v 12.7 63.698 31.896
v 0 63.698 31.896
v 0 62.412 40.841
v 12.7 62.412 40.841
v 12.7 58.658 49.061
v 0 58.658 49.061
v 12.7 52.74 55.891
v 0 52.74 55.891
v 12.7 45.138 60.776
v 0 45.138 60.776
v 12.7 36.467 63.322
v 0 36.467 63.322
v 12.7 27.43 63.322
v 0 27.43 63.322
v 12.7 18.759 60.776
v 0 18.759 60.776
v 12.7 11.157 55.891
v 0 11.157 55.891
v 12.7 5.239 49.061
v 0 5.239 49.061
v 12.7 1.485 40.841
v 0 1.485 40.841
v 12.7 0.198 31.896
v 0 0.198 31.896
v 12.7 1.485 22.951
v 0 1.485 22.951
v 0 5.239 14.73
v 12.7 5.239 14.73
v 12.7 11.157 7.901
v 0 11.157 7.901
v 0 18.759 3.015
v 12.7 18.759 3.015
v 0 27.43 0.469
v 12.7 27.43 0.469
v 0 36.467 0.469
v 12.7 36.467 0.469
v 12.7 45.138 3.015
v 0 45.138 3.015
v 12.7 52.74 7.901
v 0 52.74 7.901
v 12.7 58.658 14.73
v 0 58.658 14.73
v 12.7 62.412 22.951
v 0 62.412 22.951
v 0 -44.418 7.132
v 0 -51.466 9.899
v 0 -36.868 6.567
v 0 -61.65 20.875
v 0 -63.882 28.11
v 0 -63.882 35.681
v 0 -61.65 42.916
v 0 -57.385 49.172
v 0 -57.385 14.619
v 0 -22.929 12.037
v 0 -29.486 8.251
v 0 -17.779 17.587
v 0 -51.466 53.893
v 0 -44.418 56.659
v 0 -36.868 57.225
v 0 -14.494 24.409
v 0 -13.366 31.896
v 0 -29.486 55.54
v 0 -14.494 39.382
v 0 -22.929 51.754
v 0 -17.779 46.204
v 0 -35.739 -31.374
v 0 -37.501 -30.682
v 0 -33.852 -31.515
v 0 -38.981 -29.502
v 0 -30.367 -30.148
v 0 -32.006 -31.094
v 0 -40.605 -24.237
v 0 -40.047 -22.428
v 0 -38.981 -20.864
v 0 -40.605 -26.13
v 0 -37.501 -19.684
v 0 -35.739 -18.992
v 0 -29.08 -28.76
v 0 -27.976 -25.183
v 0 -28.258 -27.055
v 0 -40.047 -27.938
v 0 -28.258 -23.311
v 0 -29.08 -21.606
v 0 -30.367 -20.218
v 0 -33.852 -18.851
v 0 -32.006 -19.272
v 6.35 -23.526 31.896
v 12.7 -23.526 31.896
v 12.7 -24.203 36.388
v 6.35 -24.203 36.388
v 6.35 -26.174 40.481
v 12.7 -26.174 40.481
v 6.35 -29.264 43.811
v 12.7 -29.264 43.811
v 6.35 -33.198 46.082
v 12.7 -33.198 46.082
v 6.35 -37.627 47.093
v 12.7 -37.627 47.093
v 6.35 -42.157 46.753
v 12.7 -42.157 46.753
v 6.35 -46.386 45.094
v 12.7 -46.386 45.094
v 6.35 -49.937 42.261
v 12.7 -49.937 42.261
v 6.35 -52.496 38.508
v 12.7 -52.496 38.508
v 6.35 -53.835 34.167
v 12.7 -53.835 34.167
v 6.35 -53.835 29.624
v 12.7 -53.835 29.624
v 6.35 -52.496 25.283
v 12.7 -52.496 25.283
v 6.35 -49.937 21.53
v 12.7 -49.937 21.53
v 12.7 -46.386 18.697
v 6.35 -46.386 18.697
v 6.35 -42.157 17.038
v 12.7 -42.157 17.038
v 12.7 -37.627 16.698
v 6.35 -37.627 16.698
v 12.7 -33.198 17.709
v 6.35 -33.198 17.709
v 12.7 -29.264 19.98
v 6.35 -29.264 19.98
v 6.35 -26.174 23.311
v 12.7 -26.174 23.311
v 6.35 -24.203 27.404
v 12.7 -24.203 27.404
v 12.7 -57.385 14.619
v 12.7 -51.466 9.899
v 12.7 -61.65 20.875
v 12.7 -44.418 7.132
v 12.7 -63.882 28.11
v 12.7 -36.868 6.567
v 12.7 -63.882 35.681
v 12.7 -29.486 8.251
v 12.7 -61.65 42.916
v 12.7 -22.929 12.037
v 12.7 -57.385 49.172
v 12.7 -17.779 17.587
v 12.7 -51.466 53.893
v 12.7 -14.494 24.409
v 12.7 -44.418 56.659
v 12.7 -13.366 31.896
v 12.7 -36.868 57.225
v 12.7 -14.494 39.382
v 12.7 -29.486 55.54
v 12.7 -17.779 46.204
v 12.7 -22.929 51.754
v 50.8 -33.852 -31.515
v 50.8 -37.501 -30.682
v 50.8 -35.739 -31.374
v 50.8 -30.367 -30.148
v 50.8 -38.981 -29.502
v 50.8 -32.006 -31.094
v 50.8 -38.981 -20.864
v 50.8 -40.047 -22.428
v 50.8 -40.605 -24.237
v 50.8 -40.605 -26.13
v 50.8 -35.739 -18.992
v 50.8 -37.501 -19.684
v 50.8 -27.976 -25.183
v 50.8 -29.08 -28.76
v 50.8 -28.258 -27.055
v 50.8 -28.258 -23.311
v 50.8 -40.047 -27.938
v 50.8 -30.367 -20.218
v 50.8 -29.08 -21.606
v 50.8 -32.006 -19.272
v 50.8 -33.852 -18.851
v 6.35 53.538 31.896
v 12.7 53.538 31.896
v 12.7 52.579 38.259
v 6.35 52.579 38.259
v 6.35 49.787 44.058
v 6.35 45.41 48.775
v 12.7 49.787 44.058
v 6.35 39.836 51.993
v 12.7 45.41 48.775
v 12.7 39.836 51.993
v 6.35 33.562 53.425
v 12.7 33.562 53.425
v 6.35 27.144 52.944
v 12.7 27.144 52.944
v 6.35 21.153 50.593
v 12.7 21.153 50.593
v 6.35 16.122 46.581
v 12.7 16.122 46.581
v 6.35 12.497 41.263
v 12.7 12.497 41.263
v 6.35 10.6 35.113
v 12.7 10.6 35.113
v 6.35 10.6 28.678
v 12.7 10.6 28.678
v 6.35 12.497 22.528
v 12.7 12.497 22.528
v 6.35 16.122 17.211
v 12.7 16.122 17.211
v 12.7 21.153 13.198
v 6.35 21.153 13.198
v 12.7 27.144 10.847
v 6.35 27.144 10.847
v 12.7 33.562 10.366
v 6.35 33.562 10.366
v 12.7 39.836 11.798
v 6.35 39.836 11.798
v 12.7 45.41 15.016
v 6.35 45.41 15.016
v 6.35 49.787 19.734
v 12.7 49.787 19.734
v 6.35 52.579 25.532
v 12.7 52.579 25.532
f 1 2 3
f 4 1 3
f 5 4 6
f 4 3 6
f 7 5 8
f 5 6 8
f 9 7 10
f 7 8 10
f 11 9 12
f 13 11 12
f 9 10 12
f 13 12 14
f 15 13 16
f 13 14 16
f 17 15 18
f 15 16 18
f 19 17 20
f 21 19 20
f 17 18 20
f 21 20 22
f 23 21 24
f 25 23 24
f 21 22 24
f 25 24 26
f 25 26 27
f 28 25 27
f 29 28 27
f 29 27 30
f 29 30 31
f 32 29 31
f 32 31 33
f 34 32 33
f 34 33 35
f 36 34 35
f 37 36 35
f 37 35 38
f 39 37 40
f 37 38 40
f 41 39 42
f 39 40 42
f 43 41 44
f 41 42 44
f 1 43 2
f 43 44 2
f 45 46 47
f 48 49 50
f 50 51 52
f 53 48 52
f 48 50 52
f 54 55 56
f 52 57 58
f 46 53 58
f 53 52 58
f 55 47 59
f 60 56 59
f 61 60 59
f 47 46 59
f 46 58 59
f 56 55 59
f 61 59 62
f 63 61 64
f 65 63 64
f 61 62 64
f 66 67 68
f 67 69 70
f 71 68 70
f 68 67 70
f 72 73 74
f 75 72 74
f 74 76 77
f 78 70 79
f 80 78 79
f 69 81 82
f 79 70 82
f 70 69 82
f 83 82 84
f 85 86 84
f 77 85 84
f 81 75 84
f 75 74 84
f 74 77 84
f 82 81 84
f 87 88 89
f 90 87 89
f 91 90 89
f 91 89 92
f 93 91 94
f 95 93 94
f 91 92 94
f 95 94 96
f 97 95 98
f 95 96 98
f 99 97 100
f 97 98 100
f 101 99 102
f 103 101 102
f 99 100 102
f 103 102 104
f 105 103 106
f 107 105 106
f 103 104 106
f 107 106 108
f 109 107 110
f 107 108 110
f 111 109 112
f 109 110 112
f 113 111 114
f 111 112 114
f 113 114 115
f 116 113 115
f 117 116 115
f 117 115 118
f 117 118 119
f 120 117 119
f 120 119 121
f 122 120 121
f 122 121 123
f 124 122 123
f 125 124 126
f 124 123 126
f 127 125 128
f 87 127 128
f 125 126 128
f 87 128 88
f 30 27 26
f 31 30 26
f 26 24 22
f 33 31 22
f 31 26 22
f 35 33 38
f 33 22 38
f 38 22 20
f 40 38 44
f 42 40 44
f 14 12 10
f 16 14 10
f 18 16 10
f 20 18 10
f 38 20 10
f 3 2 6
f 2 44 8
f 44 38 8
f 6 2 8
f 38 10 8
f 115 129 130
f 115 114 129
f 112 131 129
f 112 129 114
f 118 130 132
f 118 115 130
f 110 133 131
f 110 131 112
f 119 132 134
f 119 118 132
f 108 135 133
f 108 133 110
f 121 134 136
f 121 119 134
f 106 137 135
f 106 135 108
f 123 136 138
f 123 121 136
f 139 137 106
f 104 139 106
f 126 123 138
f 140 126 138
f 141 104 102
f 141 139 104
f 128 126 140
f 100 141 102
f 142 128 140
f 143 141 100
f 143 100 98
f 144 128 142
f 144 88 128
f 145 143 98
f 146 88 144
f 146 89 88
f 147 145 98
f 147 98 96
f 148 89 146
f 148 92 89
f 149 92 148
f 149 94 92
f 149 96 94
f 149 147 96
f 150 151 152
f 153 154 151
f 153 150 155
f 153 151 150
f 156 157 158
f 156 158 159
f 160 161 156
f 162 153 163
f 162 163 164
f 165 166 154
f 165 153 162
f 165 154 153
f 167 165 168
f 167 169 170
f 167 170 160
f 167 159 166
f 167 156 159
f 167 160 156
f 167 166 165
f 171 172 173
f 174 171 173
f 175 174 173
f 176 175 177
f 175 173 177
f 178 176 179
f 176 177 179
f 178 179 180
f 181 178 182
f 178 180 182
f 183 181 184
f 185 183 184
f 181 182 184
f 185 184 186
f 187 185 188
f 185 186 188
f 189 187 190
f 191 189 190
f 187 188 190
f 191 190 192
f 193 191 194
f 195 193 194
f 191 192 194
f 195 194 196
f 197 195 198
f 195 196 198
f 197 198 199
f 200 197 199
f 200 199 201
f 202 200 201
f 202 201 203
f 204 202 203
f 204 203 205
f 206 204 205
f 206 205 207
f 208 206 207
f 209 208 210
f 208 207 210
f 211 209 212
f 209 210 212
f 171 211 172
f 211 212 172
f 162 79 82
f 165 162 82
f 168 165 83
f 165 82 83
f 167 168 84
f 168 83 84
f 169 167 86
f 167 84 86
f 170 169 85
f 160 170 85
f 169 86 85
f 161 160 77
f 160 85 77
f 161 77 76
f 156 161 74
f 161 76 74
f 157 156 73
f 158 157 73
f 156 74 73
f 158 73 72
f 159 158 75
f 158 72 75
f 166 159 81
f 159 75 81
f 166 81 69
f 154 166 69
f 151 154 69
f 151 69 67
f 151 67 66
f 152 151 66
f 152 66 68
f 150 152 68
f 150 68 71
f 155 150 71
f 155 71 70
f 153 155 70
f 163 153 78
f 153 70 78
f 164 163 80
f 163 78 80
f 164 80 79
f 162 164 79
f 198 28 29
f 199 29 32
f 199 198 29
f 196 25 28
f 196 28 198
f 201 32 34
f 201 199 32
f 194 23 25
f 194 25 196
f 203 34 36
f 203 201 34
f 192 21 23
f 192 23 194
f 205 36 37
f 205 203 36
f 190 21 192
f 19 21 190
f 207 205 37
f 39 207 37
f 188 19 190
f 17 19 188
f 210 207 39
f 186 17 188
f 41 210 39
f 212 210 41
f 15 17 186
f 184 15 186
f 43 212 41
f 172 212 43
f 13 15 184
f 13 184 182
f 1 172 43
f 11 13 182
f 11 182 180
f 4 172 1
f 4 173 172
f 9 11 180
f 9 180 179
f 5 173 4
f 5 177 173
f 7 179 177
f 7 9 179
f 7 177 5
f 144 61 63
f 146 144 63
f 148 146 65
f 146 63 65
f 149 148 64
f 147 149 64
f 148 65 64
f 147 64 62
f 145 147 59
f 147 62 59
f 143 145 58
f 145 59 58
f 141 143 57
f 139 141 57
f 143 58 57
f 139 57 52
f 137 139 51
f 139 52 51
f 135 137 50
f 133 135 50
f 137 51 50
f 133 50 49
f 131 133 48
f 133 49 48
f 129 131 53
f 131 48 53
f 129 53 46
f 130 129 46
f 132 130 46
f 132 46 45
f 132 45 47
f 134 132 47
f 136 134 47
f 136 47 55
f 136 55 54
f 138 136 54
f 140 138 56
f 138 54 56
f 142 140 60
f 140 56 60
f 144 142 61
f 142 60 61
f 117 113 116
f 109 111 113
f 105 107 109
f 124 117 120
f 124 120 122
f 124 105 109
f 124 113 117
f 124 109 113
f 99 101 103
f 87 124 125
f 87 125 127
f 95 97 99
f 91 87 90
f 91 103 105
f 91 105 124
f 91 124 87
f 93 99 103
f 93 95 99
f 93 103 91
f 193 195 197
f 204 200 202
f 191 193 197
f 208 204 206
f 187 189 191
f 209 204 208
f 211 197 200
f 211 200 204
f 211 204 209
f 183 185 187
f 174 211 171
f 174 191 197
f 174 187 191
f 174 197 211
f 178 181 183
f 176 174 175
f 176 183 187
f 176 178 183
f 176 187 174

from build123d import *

# Parameters (mm, degrees)
F0_R     = 6.35
F1_DEPTH = 50.8
F0_R_2   = 25.4
F0_R_3   = 31.75
F2_DEPTH = 12.7
F3_R     = 15.24
F4_R     = 21.59
F5_DEPTH = 6.35


with BuildPart() as f1:
    # F0 (on Right) → F1 (new body)
    with BuildSketch(Plane.YZ):
        with Locations((-34.326255, -25.183103)):
            Circle(F0_R)
    extrude(amount=F1_DEPTH)


with BuildPart() as f2:
    # F0 (on Right) → F2 (new body)
    with BuildSketch(Plane.YZ):
        with Locations((-38.765708, 31.89559)):
            Circle(F0_R_2)
        with Locations((31.948448, 31.89559)):
            Circle(F0_R_3)
    extrude(amount=F2_DEPTH)

    # F3 (on face) + F4 (on face) → F5 (cut)
    with BuildSketch(Plane.YZ.offset(12.7)):
        with Locations((-38.765708, 31.89559)):
            Circle(F3_R)
    with BuildSketch(Plane.YZ.offset(12.7)):
        with Locations((31.948448, 31.89559)):
            Circle(F4_R)
    extrude(amount=-F5_DEPTH, mode=Mode.SUBTRACT)


solid = Compound([f1.part, f2.part])
